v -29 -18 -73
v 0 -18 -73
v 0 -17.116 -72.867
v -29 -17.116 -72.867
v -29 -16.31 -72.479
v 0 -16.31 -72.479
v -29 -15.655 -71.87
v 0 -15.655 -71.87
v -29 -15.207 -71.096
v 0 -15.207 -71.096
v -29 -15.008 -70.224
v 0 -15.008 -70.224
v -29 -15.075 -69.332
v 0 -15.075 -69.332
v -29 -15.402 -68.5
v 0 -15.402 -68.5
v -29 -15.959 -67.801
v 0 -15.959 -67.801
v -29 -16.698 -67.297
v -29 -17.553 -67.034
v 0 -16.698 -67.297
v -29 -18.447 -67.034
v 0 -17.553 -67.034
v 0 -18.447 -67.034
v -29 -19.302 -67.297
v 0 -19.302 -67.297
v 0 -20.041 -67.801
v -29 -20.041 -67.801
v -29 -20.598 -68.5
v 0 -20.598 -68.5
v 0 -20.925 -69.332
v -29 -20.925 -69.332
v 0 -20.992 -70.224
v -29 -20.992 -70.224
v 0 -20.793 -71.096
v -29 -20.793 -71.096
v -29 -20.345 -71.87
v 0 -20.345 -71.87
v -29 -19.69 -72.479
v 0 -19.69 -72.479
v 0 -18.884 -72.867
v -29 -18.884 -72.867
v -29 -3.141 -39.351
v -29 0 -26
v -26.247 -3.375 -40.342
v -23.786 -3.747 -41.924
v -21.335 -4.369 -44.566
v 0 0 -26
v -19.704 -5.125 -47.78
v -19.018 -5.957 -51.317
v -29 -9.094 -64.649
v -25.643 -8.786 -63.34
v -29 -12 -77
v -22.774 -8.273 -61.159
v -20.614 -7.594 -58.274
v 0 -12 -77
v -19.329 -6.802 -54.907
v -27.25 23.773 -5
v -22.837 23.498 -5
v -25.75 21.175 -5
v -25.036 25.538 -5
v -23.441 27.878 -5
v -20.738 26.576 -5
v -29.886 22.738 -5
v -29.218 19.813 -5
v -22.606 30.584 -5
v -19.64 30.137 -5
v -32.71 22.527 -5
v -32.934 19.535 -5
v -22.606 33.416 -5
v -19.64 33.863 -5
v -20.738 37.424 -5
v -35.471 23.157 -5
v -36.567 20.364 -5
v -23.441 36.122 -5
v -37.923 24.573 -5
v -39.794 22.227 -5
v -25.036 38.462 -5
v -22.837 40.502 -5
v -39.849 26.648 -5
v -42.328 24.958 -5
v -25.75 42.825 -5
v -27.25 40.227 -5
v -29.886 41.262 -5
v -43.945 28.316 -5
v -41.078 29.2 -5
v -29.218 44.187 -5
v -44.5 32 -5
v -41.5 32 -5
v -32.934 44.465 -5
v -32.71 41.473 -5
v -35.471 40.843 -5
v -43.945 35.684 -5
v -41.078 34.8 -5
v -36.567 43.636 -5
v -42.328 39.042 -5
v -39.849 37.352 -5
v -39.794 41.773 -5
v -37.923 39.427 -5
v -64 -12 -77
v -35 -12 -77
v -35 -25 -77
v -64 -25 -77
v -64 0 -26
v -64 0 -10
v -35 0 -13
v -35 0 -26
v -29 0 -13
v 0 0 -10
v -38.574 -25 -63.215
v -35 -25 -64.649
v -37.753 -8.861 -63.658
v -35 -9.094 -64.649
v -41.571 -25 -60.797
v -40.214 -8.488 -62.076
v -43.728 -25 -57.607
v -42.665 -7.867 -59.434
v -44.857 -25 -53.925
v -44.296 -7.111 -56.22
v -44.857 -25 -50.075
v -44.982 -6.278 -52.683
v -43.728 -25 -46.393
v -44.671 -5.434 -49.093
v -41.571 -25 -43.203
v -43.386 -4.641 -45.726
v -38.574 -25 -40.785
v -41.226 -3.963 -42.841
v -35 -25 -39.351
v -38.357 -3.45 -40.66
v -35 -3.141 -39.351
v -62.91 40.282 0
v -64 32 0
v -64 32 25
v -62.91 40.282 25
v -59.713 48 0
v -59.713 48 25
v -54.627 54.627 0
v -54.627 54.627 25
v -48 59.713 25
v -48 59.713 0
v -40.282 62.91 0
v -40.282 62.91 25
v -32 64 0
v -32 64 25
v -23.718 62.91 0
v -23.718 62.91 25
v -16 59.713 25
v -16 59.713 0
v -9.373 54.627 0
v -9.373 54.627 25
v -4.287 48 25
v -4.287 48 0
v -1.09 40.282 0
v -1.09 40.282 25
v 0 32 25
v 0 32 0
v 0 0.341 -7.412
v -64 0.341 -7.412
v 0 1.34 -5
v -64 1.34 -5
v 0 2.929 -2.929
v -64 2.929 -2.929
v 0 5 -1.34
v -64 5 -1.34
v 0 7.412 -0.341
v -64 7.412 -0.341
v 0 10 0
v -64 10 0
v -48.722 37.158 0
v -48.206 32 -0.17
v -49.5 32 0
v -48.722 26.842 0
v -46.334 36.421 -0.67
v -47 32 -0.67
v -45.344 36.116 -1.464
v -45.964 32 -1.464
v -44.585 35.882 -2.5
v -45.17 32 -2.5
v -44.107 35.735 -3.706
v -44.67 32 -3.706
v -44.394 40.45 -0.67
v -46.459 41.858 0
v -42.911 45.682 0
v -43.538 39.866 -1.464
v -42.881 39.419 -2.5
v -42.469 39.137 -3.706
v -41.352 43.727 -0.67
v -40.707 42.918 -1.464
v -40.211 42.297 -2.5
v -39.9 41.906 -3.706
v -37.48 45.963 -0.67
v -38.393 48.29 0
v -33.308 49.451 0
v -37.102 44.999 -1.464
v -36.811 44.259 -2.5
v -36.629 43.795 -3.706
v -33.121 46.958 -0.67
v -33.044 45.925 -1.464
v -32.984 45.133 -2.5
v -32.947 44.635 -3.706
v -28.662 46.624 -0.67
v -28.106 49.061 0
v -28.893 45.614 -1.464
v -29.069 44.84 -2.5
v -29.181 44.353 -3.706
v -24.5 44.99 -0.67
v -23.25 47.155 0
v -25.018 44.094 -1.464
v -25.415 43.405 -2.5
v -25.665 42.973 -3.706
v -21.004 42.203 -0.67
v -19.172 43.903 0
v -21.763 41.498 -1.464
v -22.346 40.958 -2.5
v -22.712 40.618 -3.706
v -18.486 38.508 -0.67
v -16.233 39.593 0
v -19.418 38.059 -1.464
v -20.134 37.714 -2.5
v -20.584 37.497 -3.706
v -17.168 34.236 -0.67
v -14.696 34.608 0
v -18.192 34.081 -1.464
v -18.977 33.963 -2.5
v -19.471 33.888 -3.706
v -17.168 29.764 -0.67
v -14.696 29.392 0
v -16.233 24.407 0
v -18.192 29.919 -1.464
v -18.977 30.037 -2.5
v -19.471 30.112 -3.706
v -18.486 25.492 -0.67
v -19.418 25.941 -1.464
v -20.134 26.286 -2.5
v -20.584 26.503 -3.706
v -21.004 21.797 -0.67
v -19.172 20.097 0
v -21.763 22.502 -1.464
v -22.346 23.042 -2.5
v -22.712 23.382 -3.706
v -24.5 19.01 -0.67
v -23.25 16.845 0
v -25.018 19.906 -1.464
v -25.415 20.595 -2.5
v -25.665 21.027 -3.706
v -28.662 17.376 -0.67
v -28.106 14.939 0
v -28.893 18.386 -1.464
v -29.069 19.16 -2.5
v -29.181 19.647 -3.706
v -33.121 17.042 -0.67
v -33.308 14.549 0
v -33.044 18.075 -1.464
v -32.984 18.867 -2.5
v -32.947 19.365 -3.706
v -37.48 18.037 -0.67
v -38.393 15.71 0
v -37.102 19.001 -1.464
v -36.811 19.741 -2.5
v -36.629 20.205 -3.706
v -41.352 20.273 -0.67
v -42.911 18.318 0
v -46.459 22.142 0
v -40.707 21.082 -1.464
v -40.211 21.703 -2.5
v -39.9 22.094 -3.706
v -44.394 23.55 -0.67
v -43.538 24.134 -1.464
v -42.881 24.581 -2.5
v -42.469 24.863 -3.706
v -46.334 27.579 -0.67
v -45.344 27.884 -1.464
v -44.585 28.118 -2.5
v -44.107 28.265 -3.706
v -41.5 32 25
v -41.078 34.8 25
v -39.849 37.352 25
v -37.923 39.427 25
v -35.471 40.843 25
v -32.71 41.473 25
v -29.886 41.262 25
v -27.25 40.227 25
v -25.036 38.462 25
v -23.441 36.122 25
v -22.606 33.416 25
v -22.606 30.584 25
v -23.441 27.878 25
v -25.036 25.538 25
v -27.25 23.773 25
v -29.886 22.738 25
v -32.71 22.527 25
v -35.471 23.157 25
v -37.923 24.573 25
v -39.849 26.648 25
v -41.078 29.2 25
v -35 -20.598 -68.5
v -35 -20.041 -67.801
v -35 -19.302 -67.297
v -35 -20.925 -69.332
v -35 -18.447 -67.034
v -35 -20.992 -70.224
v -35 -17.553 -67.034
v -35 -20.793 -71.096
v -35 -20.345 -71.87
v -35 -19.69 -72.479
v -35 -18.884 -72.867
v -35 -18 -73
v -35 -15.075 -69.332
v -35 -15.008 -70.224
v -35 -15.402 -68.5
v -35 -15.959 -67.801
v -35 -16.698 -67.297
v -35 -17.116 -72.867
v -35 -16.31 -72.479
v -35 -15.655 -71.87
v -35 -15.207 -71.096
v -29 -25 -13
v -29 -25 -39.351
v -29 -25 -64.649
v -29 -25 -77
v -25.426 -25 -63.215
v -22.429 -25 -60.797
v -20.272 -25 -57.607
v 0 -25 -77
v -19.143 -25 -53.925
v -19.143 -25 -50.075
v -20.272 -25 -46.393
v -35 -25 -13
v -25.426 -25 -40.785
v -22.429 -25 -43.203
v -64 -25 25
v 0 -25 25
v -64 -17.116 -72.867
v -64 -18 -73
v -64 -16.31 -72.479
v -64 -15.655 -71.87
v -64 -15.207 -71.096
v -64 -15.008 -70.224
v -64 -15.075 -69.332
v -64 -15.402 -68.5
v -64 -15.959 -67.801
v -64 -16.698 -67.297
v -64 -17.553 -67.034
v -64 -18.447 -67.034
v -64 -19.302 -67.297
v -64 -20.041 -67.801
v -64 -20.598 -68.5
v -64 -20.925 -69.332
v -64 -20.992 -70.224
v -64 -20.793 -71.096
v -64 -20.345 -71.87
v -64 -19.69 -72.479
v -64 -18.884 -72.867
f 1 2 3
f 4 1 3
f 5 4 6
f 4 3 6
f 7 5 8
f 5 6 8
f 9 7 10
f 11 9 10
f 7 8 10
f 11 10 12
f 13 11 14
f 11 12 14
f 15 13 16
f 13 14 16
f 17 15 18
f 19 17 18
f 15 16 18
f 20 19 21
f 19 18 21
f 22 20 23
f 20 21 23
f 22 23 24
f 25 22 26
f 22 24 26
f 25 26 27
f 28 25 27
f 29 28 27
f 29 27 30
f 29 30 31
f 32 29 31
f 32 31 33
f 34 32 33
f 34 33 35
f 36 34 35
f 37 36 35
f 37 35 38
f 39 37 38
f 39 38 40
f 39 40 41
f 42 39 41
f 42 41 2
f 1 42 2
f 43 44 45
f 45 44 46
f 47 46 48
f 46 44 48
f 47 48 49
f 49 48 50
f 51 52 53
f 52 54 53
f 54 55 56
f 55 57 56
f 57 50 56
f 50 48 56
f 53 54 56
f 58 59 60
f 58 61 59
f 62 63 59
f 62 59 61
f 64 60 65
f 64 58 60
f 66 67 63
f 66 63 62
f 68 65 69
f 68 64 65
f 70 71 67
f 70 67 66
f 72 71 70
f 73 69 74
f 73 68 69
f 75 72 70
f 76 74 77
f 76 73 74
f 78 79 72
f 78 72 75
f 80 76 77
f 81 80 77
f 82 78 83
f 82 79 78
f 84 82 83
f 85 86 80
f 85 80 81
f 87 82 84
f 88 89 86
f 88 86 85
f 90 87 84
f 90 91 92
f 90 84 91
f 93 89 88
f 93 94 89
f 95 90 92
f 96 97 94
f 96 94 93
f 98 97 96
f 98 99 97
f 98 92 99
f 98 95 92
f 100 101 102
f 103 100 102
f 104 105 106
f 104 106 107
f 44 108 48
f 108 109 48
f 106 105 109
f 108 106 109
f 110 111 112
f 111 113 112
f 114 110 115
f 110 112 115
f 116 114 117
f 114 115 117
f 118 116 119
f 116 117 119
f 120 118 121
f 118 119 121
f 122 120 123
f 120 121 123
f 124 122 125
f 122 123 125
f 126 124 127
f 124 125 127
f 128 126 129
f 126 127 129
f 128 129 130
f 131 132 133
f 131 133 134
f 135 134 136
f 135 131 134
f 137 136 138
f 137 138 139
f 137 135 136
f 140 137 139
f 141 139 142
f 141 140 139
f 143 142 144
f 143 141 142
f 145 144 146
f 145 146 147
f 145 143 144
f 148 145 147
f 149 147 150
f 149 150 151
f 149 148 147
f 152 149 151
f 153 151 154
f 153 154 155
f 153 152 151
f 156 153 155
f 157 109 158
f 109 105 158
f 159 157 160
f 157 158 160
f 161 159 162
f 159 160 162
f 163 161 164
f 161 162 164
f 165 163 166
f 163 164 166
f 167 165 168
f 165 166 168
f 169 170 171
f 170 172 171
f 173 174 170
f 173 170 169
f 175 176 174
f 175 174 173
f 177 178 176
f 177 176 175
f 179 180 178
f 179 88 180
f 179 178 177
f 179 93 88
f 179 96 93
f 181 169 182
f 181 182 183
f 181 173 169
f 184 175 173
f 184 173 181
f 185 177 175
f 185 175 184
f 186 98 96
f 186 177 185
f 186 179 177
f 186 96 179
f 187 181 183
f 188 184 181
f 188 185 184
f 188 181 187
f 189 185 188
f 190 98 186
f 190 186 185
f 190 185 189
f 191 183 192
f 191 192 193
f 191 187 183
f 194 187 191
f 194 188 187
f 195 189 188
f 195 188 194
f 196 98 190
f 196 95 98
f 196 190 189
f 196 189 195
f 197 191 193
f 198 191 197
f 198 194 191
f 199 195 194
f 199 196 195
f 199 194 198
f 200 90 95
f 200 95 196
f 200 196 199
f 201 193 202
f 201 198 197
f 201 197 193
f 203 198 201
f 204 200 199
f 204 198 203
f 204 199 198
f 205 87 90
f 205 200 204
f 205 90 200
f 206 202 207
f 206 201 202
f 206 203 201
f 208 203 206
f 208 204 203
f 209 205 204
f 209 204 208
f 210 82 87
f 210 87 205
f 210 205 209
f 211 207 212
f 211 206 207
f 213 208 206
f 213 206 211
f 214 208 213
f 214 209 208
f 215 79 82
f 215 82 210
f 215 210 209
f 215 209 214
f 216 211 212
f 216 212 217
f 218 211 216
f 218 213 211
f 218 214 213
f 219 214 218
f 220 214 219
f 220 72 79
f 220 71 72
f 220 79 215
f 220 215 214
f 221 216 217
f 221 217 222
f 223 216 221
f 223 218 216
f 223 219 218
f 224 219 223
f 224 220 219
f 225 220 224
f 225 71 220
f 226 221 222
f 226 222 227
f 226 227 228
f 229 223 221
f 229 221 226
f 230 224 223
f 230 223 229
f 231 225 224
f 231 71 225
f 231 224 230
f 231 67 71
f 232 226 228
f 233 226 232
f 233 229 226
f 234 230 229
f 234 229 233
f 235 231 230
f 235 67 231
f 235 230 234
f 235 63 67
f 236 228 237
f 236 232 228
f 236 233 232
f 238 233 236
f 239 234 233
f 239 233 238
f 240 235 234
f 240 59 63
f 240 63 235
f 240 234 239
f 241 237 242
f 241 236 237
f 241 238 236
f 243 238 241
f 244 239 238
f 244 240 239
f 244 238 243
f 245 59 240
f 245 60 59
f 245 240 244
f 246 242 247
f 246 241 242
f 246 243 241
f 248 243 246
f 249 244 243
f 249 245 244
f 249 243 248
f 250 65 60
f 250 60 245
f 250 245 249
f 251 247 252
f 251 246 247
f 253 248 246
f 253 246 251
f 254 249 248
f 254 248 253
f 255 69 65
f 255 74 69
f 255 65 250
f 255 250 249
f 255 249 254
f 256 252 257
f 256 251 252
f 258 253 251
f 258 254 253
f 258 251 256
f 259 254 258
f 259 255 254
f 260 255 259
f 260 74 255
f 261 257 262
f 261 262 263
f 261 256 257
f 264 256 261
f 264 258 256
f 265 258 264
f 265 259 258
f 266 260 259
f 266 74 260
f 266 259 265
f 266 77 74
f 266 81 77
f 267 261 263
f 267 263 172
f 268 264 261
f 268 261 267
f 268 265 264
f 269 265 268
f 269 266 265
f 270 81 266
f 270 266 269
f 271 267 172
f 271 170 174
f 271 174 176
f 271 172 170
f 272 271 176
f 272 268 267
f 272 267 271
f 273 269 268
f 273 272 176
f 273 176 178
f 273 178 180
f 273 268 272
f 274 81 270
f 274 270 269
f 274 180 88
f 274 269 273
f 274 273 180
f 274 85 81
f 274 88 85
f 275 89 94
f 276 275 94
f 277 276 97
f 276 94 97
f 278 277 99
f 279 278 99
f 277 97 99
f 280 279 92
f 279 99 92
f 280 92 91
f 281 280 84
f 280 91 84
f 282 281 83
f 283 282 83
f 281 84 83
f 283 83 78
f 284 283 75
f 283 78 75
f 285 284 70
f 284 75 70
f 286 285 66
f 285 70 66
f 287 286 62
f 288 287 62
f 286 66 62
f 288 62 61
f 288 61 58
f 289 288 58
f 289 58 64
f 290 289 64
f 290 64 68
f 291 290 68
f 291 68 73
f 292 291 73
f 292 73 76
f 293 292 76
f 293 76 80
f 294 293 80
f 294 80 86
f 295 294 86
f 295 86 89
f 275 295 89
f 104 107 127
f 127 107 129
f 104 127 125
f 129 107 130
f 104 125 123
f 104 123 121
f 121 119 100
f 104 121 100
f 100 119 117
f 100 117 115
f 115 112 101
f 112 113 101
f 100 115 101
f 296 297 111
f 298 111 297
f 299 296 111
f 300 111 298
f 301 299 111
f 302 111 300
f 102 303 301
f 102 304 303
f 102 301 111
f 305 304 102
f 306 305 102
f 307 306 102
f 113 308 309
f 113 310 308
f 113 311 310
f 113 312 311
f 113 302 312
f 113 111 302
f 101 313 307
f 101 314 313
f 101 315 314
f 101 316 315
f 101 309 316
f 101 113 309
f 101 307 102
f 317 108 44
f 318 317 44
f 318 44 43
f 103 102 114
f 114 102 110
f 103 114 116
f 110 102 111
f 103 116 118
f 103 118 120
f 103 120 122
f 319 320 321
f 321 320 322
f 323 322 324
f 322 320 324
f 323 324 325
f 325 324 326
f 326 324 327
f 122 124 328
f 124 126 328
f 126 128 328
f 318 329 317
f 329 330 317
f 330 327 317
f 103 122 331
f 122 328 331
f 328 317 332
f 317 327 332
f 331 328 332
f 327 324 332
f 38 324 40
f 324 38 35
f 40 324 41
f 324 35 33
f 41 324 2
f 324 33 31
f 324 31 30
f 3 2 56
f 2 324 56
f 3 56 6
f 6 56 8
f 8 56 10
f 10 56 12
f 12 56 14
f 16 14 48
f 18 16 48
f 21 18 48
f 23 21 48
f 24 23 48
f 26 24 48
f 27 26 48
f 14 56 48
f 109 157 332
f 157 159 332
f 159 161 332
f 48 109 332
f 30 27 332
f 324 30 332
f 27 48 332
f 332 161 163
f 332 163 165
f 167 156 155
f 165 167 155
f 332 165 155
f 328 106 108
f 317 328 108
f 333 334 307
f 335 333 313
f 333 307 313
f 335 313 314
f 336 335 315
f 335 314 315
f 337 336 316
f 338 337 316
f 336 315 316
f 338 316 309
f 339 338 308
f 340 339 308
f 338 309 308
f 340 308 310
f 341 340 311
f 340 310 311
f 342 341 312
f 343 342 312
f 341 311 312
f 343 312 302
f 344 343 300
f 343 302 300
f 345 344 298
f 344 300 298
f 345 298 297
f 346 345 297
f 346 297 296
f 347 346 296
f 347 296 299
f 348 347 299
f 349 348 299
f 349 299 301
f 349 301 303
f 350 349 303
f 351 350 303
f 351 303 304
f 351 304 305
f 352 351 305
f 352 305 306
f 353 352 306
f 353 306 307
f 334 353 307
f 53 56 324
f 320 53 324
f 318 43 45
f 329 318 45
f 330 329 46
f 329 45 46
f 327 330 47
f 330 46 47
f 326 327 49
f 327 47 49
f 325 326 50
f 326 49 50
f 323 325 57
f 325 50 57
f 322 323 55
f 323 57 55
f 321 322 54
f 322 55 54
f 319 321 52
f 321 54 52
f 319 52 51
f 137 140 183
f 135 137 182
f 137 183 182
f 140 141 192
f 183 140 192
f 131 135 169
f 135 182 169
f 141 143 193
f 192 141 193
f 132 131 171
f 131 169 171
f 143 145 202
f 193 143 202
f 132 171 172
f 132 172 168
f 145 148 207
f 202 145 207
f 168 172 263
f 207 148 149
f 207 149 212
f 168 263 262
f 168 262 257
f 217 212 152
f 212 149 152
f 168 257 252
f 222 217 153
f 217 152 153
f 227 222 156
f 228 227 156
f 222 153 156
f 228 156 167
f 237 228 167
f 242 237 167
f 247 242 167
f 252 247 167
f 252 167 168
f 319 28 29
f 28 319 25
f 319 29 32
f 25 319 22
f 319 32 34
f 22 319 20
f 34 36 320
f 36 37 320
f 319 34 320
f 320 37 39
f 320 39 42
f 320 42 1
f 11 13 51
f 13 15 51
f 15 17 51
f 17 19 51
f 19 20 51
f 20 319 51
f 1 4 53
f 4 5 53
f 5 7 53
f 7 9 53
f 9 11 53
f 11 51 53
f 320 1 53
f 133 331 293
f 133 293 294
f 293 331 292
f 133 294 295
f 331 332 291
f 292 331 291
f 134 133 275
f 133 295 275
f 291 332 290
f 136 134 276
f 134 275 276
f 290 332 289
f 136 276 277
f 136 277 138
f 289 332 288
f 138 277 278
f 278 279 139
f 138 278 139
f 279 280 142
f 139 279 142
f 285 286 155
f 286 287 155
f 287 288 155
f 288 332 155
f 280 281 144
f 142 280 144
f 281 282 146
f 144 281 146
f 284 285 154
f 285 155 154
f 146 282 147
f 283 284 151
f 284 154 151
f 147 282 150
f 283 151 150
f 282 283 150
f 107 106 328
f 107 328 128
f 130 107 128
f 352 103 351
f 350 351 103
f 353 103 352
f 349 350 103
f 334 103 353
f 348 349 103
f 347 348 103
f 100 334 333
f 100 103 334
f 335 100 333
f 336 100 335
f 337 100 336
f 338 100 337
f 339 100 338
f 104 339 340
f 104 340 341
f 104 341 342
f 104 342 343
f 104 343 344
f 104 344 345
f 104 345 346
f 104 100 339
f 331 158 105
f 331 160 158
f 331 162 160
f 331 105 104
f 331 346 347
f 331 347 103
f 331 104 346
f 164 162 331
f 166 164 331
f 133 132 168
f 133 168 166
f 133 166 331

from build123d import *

# Parameters (mm, degrees)
ESTRUSIONE_ESTRUSIONE1_DEPTH = 64
RACCORDO1_RADIUS             = 32
RACCORDO1_LENGTH             = 25
SCHIZZO2_R                   = 13
TAGLIO_ESTRUSIONE1_DEPTH     = 119.831813922
SCHIZZO5_W                   = 6
SCHIZZO5_H                   = 64
TAGLIO_ESTRUSIONE2_DEPTH     = 119.831813922
TAGLIO_ESTRUSIONE3_DEPTH     = 119.831813922
SCHIZZO7_R                   = 3
TAGLIO_ESTRUSIONE4_DEPTH     = 119.831813922
SCHIZZO8_R                   = 12.5
ESTRUSIONE_ESTRUSIONE2_DEPTH = 5
SCHIZZO9_R                   = 9.5
TAGLIO_ESTRUSIONE5_DEPTH     = 116.654658358
RACCORDO2_R                  = 10
RACCORDO3_R                  = 5


with BuildPart() as part:
    # Schizzo1 → Estrusione-Estrusione1 (new body)
    with BuildSketch(Plane(origin=(0, 0, 0), x_dir=(0, 0, -1), z_dir=(1, 0, 0))):
        Polygon((0, 0), (77, 0), (77, -25), (-25, -25), (-25, 64), (0, 64), align=None)
    extrude(amount=-ESTRUSIONE_ESTRUSIONE1_DEPTH)

    # Raccordo1: full round fillet: the end face becomes a half cylinder, R = half its width
    raccordo1_face = Plane((-32, 64, 12.5), x_dir=(0, 0, -1), z_dir=(0, 1, 0))  # on the end face: x along it, z out of the body
    raccordo1_slab = raccordo1_face.offset(-RACCORDO1_RADIUS / 2) * Box(RACCORDO1_LENGTH, 2 * RACCORDO1_RADIUS, RACCORDO1_RADIUS, mode=Mode.PRIVATE)  # the body's end, R deep
    raccordo1_round = Plane((-32, 32, 12.5), x_dir=(0, 1, 0), z_dir=(0, 0, -1)) * Cylinder(RACCORDO1_RADIUS, RACCORDO1_LENGTH, mode=Mode.PRIVATE)  # its axis R under the face
    add(raccordo1_slab - raccordo1_round, mode=Mode.SUBTRACT)

    # Schizzo2 → Taglio-Estrusione1 (cut, through all)
    with BuildSketch(Plane(origin=(0, 0, 0), x_dir=(1, 0, 0), z_dir=(0, 1, 0))):
        with Locations(Location((-32, 52, 0), (0, 0, 270))):
            Circle(SCHIZZO2_R)
    extrude(amount=-TAGLIO_ESTRUSIONE1_DEPTH, mode=Mode.SUBTRACT)

    # Schizzo5 → Taglio-Estrusione2 (cut, through all)
    with BuildSketch(Plane(origin=(0, 0, 0), x_dir=(1, 0, 0), z_dir=(0, 1, 0))):
        with Locations((-32, 45)):
            Rectangle(SCHIZZO5_W, SCHIZZO5_H)
    extrude(amount=-TAGLIO_ESTRUSIONE2_DEPTH, mode=Mode.SUBTRACT)

    # Schizzo6 → Taglio-Estrusione3 (cut, through all)
    with BuildSketch(Plane(origin=(0, 0, 0), x_dir=(0, 0, -1), z_dir=(1, 0, 0))):
        Polygon((26, 0), (77, -12), (77, 0), align=None)
    extrude(amount=-TAGLIO_ESTRUSIONE3_DEPTH, mode=Mode.SUBTRACT)

    # Schizzo7 → Taglio-Estrusione4 (cut, through all)
    with BuildSketch(Plane(origin=(0, 0, 0), x_dir=(0, 0, -1), z_dir=(1, 0, 0))):
        with Locations((70, -18)):
            Circle(SCHIZZO7_R)
    extrude(amount=-TAGLIO_ESTRUSIONE4_DEPTH, mode=Mode.SUBTRACT)

    # Schizzo8 → Estrusione-Estrusione2 (add)
    with BuildSketch(Plane(origin=(0, 0, 0), x_dir=(-1, 0, 0), z_dir=(0, 0, -1))):
        with Locations((32, 32)):
            Circle(SCHIZZO8_R)
    extrude(amount=ESTRUSIONE_ESTRUSIONE2_DEPTH)

    # Schizzo9 → Taglio-Estrusione5 (cut, through all)
    with BuildSketch(Plane(origin=(0, 0, -5), x_dir=(-1, 0, 0), z_dir=(0, 0, -1))):
        with Locations((32, 32)):
            Circle(SCHIZZO9_R)
    extrude(amount=-TAGLIO_ESTRUSIONE5_DEPTH, mode=Mode.SUBTRACT)

    # Raccordo2
    raccordo2_edges = [part.edges().sort_by_distance(p)[0] for p in [
        (-32, 0, 0),
    ]]
    fillet(raccordo2_edges, radius=RACCORDO2_R)

    # Raccordo3
    raccordo3_edges = [part.edges().sort_by_distance(p)[0] for p in [
        (-19.5, 32, 0),
    ]]
    fillet(raccordo3_edges, radius=RACCORDO3_R - 0.0001)  # a hair under: the kernel refuses the full size


solid = part.part
